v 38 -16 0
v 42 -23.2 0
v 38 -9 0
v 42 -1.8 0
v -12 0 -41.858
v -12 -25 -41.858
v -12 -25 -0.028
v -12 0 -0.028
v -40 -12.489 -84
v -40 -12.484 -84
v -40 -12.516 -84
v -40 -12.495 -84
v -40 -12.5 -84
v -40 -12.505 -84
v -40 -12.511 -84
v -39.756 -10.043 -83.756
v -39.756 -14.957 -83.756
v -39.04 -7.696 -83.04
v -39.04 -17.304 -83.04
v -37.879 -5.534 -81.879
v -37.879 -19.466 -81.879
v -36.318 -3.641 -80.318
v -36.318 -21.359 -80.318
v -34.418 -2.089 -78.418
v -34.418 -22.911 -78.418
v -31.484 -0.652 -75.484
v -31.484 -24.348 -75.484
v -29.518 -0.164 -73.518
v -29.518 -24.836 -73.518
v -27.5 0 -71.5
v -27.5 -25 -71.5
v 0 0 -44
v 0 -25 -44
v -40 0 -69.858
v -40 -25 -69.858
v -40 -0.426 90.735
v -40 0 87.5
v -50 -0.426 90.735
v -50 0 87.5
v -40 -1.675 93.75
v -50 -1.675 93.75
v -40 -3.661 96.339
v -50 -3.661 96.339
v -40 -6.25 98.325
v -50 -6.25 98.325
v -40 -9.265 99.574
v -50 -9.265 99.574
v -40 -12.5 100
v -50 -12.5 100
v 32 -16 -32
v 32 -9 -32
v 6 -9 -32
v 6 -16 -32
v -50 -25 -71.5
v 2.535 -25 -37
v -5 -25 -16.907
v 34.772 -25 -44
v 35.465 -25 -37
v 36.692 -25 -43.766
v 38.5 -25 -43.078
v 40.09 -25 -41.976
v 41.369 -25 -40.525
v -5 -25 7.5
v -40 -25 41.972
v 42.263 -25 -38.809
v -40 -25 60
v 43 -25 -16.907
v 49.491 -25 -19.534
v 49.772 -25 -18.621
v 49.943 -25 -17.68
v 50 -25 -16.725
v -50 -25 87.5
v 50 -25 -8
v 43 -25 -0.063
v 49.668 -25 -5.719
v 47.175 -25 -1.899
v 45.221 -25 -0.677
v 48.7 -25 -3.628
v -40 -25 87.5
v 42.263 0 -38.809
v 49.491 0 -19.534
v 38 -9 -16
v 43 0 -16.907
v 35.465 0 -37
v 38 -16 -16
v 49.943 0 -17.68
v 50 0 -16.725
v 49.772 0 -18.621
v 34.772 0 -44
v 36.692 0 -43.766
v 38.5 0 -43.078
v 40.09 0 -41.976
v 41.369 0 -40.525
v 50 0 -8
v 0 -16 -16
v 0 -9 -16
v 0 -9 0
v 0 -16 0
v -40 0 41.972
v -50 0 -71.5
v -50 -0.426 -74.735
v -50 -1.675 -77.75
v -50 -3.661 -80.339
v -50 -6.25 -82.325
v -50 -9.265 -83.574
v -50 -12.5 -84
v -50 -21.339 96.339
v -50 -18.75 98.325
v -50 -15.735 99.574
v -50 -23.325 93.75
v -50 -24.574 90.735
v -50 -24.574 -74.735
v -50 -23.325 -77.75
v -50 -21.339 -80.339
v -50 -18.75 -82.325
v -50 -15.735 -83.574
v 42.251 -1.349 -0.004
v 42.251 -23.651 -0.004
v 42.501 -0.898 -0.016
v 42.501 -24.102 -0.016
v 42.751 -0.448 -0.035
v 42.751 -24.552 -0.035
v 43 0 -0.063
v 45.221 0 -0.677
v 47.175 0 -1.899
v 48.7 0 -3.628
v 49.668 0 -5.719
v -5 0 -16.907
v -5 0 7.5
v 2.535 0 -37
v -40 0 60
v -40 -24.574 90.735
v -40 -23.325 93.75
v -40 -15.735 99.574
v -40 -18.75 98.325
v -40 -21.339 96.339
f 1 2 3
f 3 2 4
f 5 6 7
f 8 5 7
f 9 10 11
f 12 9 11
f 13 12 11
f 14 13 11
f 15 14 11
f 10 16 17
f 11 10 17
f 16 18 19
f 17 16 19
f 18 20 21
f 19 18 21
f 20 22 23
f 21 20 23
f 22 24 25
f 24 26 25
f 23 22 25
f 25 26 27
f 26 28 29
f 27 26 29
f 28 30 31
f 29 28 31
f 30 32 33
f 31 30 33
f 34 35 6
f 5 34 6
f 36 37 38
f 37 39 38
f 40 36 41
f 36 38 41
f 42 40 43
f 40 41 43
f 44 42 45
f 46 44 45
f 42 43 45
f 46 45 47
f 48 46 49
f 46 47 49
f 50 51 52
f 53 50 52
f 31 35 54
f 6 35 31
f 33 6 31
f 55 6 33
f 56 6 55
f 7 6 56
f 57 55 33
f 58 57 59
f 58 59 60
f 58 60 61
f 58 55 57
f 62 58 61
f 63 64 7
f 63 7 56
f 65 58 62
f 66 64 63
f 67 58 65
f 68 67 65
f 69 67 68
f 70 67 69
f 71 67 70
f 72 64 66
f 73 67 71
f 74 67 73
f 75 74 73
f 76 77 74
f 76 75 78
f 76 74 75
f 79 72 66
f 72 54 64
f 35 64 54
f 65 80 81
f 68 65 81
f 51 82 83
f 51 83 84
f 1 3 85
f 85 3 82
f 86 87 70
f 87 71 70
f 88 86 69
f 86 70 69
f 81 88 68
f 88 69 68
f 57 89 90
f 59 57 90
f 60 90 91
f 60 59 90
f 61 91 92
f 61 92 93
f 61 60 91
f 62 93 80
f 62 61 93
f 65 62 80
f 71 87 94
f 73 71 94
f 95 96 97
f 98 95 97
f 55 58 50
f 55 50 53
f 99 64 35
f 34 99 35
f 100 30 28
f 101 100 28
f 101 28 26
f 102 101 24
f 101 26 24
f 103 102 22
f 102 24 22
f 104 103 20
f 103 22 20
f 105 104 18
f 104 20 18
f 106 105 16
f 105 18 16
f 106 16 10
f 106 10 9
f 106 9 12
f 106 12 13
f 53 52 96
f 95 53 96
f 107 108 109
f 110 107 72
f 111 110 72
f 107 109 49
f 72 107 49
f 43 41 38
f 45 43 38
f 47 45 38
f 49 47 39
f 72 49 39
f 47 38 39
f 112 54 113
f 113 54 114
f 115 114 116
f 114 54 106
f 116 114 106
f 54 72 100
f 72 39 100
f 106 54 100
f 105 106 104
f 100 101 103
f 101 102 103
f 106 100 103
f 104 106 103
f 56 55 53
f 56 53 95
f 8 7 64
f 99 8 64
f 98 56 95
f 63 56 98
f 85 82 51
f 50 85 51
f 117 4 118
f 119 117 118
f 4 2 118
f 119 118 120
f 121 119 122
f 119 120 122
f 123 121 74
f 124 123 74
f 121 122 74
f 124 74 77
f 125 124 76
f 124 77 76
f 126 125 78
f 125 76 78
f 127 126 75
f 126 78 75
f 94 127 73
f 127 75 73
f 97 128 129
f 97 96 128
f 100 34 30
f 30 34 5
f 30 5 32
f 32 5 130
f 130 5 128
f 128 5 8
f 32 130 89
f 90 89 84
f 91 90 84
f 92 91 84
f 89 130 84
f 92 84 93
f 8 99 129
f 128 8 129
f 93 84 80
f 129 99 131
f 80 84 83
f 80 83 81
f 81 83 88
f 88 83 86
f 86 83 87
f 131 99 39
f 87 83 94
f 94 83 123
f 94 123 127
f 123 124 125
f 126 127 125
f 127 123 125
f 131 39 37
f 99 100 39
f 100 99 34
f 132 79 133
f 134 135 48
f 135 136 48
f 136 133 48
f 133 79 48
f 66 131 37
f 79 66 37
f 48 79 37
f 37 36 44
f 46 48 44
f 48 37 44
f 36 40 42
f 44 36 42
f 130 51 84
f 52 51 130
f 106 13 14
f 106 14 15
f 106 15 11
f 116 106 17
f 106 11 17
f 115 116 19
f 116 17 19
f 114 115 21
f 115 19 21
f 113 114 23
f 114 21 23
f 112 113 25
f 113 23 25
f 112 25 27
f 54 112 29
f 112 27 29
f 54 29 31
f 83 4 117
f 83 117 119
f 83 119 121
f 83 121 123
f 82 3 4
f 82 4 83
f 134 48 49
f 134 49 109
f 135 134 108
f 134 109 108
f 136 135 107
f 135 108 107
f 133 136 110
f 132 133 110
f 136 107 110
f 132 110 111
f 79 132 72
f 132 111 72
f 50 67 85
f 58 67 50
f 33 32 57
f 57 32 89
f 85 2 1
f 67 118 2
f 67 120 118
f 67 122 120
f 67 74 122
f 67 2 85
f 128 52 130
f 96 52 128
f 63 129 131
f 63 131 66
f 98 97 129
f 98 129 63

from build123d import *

# Parameters (mm, degrees)
F1_DEPTH = 25
F2_SIZE2 = 5
F2_SIZE  = 9
F3_SIZE2 = 9
F3_SIZE  = 5
F4_R     = 8
F5_R     = 12.49999
F6_SIZE2 = 39.99999
F6_SIZE  = 59.99999
F7_SIZE  = 39.99999
F9_DEPTH = 25.001


# Not quite as in the source:
# - a fillet or chamfer is up to 0.001 mm smaller than in the source, because OpenCascade refuses the exact size


with BuildPart() as f1:
    # F0 (on Front) → F1 (new body)
    with BuildSketch(Plane.XZ):
        Polygon((0, -16), (0, 0), (-40, 0), (-40, 100), (-50, 100), (-50, -84), (-40, -84), (-40, -44), (40.316005618, -44), (50, -18.1760149813), (50, 0), (38, 0), (38, -16), (32, -32), (6, -32), align=None)
    extrude(amount=F1_DEPTH)

    # F2
    f2_edges = [f1.edges().sort_by_distance(p)[0] for p in [
        (19, -25, -32),
        (3, -25, -24),
        (0, -25, -8),
        (35, -25, -24),
        (38, -25, -8),
    ]]
    chamfer(f2_edges, length=F2_SIZE, length2=F2_SIZE2)

    # F3
    f3_edges = [f1.edges().sort_by_distance(p)[0] for p in [
        (19, 0, -32),
        (3, 0, -24),
        (0, 0, -8),
        (35, 0, -24),
        (38, 0, -8),
    ]]
    f3_side = f1.faces().sort_by_distance((-19.786858, 0, -11.21384))[0]
    chamfer(f3_edges, length=F3_SIZE, length2=F3_SIZE2, reference=f3_side)

    # F4
    f4_edges = [f1.edges().sort_by_distance(p)[0] for p in [
        (40.316006, -12.5, -44),
        (50, -12.5, -18.176015),
        (50, -12.5, 0),
    ]]
    fillet(f4_edges, radius=F4_R)

    # F5 (radius 12.5 in the source; OpenCascade refuses exactly that, so slightly less here)
    f5_edges = [f1.edges().sort_by_distance(p)[0] for p in [
        (-45, -25, -84),
        (-45, 0, -84),
        (-45, -25, 100),
        (-45, 0, 100),
    ]]
    fillet(f5_edges, radius=F5_R)

    # F6 (size 60 and 40 in the source; OpenCascade refuses exactly that, so slightly less here)
    f6_edges = [f1.edges().sort_by_distance(p)[0] for p in [
        (-40, -12.5, 0),
    ]]
    f6_side = f1.faces().sort_by_distance((-40, -12.5, 48.698732))[0]
    chamfer(f6_edges, length=F6_SIZE, length2=F6_SIZE2, reference=f6_side)

    # F7 (size 40 in the source; OpenCascade refuses exactly that, so slightly less here)
    f7_edges = [f1.edges().sort_by_distance(p)[0] for p in [
        (-40, -12.5, -44),
    ]]
    chamfer(f7_edges, length=F7_SIZE)

    # F8 (on face) → F9 (cut, through all)
    with BuildSketch(Plane.XZ.offset(25)):
        Polygon((-12, -0.0277563773), (-40, 41.9722436227), (-40, -69.8578643763), (-12, -41.8578643763), align=None)
    extrude(amount=-F9_DEPTH, mode=Mode.SUBTRACT)


solid = f1.part
